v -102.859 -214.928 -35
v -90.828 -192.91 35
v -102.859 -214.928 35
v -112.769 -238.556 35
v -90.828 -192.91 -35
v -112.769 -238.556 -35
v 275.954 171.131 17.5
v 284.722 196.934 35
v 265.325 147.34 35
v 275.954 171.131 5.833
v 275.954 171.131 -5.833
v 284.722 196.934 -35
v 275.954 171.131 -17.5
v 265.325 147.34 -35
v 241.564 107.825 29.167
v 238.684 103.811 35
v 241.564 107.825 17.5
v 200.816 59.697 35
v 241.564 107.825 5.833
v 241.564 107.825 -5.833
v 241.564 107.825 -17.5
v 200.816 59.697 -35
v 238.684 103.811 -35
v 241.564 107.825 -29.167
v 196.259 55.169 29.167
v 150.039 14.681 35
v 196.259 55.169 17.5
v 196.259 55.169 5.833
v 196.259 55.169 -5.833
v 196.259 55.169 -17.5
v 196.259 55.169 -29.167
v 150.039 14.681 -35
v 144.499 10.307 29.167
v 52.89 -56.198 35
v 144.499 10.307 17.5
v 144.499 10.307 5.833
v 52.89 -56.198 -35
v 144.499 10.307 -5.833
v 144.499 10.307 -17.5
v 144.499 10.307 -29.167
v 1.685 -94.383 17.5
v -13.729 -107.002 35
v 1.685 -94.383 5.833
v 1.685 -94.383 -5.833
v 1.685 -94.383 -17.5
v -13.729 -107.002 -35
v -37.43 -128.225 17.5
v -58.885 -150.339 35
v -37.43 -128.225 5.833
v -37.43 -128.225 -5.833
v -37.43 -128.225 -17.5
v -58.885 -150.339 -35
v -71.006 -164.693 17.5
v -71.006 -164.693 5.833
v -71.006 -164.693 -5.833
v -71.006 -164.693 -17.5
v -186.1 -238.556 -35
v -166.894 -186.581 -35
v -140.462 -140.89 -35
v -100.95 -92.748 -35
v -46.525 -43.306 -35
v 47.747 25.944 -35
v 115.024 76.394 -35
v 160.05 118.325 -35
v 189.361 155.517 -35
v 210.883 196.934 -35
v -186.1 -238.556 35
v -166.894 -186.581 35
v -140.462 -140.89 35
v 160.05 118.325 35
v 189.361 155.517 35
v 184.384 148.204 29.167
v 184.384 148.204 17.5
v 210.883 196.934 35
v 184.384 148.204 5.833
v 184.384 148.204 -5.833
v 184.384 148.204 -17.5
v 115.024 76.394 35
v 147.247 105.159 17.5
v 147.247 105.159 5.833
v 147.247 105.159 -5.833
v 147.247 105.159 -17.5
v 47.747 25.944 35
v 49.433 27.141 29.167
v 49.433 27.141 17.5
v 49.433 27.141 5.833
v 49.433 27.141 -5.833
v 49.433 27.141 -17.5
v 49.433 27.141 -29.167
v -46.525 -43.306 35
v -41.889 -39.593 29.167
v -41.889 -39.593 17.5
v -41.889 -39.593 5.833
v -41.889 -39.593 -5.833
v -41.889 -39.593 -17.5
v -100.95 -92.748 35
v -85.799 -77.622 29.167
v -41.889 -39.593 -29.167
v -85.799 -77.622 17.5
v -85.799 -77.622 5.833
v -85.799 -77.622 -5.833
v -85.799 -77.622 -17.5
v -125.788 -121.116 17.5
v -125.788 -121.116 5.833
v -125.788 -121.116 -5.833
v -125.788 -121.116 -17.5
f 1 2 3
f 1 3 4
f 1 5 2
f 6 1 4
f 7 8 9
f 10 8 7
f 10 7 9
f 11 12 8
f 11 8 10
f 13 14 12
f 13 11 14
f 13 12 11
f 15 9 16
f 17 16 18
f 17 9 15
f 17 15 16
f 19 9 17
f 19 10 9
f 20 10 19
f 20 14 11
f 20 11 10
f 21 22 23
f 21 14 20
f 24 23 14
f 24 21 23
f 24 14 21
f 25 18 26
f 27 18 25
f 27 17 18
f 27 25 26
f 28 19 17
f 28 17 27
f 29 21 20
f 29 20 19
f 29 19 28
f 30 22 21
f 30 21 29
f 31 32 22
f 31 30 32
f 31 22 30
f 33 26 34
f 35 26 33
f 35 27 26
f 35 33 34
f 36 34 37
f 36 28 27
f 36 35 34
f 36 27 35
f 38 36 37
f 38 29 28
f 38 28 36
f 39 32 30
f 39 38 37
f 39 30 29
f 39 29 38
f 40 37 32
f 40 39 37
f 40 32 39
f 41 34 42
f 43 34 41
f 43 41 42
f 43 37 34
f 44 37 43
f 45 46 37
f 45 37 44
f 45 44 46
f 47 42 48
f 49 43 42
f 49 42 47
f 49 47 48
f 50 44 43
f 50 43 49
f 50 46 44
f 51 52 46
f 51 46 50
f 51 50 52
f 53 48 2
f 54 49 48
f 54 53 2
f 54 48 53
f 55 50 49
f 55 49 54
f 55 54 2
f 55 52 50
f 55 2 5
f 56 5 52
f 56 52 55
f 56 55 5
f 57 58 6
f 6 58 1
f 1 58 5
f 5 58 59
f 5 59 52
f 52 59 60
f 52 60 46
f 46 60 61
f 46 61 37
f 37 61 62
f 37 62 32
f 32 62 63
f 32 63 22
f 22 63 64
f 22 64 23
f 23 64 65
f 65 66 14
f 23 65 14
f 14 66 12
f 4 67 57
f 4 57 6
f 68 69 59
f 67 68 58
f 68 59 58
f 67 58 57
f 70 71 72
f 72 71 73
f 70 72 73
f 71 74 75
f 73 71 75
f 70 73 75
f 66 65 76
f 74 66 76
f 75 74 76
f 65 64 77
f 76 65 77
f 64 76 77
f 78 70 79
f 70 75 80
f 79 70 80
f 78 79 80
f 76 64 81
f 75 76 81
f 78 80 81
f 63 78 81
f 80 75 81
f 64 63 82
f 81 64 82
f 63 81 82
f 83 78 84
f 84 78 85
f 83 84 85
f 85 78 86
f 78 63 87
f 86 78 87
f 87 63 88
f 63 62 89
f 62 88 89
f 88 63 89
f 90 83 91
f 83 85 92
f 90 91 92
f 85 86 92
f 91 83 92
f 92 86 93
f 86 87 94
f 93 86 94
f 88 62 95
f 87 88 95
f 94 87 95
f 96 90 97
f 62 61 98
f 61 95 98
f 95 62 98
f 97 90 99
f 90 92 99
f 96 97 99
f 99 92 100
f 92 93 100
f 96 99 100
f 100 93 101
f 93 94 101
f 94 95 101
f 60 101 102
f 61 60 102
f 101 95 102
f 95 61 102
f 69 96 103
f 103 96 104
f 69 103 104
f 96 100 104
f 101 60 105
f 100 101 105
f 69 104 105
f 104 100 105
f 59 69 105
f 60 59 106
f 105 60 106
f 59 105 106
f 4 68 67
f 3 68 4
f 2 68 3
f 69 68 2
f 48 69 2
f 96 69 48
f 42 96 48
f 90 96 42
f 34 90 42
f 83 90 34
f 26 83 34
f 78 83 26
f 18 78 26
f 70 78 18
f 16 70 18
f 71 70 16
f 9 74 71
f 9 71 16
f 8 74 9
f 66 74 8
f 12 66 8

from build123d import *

# Parameters (mm, degrees)
SWEEP_START         = -35
SWEEP_1_DEPTH       = 70
CUT_EXTRUDE_2_DEPTH = 50
SKETCH_5_W          = 140.372929197
SKETCH_5_H          = 70.259224127
CUT_EXTRUDE_3_DEPTH = 50


# Read off the part's stored shape, not the designer's step: 扫描1
with BuildPart() as part:
    # 扫描1 outline → 扫描1 (new body)
    with BuildSketch(Plane.XY.offset(SWEEP_START)):
        with BuildLine():
            Line((296.564615022, 274.38689053), (226.598573257, 276.567028069))
            add(Edge.make_bspline(
                [(226.598573257, 276.567028069), (226.122488542, 261.288284191), (224.451690955, 247.155649258), (219.089653574, 220.717489302), (215.399401116, 208.40919063), (206.235433473, 185.12649183), (200.758662752, 174.148786785), (188.150641595, 153.125870735), (181.016094816, 143.081433196), (157.330590321, 113.952712829), (138.463163827, 95.874728611), (96.477489777, 60.961246529), (73.38565364, 44.146471525), (25.481340147, 10.134618125), (0.673613184, -7.062926968), (-48.083061525, -43.949235156), (-72.047844266, -63.645210456), (-105.25054385, -96.916333242), (-115.856771287, -108.630774221), (-135.720134821, -133.60208084), (-144.976351275, -146.860833281), (-161.661047766, -175.147036825), (-169.086764703, -190.174737104), (-181.634547375, -222.113027169), (-186.754405107, -239.020863028), (-190.52902045, -256.889221865)],
                knots=[0, 0, 0, 0, 0.0625, 0.0625, 0.125, 0.125, 0.1875, 0.1875, 0.25, 0.25, 0.375, 0.375, 0.5, 0.5, 0.625, 0.625, 0.75, 0.75, 0.8125, 0.8125, 0.875, 0.875, 0.9375, 0.9375, 1, 1, 1, 1], degree=3))
            Line((-190.52902045, -256.889221865), (-122.040485139, -271.357135708))
            add(Edge.make_bspline(
                [(296.564615022, 274.38689053), (295.971282235, 255.345364054), (293.863748523, 237.229761394), (286.884130269, 202.815927489), (282.011058386, 186.520469888), (269.896218843, 155.740553252), (262.657506721, 141.259399135), (246.315238227, 114.009909757), (237.214978199, 101.240801032), (207.866328138, 65.147475641), (185.60467275, 44.035553396), (138.848901666, 5.155463629), (114.32837455, -12.633426756), (65.587356502, -47.239336738), (41.362115165, -64.055889638), (-4.305075435, -98.604883731), (-25.731189713, -116.330112712), (-54.086274953, -144.743631325), (-62.911215673, -154.516209977), (-79.101167015, -174.869471819), (-86.467097278, -185.448268211), (-99.58483824, -207.687275741), (-105.339412039, -219.347237708), (-115.077520317, -244.133969753), (-119.063262798, -257.263493763), (-122.040485139, -271.357135708)],
                knots=[0, 0, 0, 0, 0.0625, 0.0625, 0.125, 0.125, 0.1875, 0.1875, 0.25, 0.25, 0.375, 0.375, 0.5, 0.5, 0.625, 0.625, 0.75, 0.75, 0.8125, 0.8125, 0.875, 0.875, 0.9375, 0.9375, 1, 1, 1, 1], degree=3))
        make_face()
    extrude(amount=SWEEP_1_DEPTH)

    # 草图4 → 切除-拉伸2 (cut, symmetric)
    with BuildSketch(Plane.XY):
        Polygon((196.354363501, 196.934484181), (331.188865509, 196.934484181), (331.188865509, 351.743238219), (86.208590838, 351.743238219), align=None)
    extrude(amount=CUT_EXTRUDE_2_DEPTH, both=True, mode=Mode.SUBTRACT)

    # 草图5 → 切除-拉伸3 (cut, symmetric)
    with BuildSketch(Plane.XY):
        with Locations((-131.655915803, -273.68587269)):
            Rectangle(SKETCH_5_W, SKETCH_5_H)
    extrude(amount=CUT_EXTRUDE_3_DEPTH, both=True, mode=Mode.SUBTRACT)


solid = part.part
